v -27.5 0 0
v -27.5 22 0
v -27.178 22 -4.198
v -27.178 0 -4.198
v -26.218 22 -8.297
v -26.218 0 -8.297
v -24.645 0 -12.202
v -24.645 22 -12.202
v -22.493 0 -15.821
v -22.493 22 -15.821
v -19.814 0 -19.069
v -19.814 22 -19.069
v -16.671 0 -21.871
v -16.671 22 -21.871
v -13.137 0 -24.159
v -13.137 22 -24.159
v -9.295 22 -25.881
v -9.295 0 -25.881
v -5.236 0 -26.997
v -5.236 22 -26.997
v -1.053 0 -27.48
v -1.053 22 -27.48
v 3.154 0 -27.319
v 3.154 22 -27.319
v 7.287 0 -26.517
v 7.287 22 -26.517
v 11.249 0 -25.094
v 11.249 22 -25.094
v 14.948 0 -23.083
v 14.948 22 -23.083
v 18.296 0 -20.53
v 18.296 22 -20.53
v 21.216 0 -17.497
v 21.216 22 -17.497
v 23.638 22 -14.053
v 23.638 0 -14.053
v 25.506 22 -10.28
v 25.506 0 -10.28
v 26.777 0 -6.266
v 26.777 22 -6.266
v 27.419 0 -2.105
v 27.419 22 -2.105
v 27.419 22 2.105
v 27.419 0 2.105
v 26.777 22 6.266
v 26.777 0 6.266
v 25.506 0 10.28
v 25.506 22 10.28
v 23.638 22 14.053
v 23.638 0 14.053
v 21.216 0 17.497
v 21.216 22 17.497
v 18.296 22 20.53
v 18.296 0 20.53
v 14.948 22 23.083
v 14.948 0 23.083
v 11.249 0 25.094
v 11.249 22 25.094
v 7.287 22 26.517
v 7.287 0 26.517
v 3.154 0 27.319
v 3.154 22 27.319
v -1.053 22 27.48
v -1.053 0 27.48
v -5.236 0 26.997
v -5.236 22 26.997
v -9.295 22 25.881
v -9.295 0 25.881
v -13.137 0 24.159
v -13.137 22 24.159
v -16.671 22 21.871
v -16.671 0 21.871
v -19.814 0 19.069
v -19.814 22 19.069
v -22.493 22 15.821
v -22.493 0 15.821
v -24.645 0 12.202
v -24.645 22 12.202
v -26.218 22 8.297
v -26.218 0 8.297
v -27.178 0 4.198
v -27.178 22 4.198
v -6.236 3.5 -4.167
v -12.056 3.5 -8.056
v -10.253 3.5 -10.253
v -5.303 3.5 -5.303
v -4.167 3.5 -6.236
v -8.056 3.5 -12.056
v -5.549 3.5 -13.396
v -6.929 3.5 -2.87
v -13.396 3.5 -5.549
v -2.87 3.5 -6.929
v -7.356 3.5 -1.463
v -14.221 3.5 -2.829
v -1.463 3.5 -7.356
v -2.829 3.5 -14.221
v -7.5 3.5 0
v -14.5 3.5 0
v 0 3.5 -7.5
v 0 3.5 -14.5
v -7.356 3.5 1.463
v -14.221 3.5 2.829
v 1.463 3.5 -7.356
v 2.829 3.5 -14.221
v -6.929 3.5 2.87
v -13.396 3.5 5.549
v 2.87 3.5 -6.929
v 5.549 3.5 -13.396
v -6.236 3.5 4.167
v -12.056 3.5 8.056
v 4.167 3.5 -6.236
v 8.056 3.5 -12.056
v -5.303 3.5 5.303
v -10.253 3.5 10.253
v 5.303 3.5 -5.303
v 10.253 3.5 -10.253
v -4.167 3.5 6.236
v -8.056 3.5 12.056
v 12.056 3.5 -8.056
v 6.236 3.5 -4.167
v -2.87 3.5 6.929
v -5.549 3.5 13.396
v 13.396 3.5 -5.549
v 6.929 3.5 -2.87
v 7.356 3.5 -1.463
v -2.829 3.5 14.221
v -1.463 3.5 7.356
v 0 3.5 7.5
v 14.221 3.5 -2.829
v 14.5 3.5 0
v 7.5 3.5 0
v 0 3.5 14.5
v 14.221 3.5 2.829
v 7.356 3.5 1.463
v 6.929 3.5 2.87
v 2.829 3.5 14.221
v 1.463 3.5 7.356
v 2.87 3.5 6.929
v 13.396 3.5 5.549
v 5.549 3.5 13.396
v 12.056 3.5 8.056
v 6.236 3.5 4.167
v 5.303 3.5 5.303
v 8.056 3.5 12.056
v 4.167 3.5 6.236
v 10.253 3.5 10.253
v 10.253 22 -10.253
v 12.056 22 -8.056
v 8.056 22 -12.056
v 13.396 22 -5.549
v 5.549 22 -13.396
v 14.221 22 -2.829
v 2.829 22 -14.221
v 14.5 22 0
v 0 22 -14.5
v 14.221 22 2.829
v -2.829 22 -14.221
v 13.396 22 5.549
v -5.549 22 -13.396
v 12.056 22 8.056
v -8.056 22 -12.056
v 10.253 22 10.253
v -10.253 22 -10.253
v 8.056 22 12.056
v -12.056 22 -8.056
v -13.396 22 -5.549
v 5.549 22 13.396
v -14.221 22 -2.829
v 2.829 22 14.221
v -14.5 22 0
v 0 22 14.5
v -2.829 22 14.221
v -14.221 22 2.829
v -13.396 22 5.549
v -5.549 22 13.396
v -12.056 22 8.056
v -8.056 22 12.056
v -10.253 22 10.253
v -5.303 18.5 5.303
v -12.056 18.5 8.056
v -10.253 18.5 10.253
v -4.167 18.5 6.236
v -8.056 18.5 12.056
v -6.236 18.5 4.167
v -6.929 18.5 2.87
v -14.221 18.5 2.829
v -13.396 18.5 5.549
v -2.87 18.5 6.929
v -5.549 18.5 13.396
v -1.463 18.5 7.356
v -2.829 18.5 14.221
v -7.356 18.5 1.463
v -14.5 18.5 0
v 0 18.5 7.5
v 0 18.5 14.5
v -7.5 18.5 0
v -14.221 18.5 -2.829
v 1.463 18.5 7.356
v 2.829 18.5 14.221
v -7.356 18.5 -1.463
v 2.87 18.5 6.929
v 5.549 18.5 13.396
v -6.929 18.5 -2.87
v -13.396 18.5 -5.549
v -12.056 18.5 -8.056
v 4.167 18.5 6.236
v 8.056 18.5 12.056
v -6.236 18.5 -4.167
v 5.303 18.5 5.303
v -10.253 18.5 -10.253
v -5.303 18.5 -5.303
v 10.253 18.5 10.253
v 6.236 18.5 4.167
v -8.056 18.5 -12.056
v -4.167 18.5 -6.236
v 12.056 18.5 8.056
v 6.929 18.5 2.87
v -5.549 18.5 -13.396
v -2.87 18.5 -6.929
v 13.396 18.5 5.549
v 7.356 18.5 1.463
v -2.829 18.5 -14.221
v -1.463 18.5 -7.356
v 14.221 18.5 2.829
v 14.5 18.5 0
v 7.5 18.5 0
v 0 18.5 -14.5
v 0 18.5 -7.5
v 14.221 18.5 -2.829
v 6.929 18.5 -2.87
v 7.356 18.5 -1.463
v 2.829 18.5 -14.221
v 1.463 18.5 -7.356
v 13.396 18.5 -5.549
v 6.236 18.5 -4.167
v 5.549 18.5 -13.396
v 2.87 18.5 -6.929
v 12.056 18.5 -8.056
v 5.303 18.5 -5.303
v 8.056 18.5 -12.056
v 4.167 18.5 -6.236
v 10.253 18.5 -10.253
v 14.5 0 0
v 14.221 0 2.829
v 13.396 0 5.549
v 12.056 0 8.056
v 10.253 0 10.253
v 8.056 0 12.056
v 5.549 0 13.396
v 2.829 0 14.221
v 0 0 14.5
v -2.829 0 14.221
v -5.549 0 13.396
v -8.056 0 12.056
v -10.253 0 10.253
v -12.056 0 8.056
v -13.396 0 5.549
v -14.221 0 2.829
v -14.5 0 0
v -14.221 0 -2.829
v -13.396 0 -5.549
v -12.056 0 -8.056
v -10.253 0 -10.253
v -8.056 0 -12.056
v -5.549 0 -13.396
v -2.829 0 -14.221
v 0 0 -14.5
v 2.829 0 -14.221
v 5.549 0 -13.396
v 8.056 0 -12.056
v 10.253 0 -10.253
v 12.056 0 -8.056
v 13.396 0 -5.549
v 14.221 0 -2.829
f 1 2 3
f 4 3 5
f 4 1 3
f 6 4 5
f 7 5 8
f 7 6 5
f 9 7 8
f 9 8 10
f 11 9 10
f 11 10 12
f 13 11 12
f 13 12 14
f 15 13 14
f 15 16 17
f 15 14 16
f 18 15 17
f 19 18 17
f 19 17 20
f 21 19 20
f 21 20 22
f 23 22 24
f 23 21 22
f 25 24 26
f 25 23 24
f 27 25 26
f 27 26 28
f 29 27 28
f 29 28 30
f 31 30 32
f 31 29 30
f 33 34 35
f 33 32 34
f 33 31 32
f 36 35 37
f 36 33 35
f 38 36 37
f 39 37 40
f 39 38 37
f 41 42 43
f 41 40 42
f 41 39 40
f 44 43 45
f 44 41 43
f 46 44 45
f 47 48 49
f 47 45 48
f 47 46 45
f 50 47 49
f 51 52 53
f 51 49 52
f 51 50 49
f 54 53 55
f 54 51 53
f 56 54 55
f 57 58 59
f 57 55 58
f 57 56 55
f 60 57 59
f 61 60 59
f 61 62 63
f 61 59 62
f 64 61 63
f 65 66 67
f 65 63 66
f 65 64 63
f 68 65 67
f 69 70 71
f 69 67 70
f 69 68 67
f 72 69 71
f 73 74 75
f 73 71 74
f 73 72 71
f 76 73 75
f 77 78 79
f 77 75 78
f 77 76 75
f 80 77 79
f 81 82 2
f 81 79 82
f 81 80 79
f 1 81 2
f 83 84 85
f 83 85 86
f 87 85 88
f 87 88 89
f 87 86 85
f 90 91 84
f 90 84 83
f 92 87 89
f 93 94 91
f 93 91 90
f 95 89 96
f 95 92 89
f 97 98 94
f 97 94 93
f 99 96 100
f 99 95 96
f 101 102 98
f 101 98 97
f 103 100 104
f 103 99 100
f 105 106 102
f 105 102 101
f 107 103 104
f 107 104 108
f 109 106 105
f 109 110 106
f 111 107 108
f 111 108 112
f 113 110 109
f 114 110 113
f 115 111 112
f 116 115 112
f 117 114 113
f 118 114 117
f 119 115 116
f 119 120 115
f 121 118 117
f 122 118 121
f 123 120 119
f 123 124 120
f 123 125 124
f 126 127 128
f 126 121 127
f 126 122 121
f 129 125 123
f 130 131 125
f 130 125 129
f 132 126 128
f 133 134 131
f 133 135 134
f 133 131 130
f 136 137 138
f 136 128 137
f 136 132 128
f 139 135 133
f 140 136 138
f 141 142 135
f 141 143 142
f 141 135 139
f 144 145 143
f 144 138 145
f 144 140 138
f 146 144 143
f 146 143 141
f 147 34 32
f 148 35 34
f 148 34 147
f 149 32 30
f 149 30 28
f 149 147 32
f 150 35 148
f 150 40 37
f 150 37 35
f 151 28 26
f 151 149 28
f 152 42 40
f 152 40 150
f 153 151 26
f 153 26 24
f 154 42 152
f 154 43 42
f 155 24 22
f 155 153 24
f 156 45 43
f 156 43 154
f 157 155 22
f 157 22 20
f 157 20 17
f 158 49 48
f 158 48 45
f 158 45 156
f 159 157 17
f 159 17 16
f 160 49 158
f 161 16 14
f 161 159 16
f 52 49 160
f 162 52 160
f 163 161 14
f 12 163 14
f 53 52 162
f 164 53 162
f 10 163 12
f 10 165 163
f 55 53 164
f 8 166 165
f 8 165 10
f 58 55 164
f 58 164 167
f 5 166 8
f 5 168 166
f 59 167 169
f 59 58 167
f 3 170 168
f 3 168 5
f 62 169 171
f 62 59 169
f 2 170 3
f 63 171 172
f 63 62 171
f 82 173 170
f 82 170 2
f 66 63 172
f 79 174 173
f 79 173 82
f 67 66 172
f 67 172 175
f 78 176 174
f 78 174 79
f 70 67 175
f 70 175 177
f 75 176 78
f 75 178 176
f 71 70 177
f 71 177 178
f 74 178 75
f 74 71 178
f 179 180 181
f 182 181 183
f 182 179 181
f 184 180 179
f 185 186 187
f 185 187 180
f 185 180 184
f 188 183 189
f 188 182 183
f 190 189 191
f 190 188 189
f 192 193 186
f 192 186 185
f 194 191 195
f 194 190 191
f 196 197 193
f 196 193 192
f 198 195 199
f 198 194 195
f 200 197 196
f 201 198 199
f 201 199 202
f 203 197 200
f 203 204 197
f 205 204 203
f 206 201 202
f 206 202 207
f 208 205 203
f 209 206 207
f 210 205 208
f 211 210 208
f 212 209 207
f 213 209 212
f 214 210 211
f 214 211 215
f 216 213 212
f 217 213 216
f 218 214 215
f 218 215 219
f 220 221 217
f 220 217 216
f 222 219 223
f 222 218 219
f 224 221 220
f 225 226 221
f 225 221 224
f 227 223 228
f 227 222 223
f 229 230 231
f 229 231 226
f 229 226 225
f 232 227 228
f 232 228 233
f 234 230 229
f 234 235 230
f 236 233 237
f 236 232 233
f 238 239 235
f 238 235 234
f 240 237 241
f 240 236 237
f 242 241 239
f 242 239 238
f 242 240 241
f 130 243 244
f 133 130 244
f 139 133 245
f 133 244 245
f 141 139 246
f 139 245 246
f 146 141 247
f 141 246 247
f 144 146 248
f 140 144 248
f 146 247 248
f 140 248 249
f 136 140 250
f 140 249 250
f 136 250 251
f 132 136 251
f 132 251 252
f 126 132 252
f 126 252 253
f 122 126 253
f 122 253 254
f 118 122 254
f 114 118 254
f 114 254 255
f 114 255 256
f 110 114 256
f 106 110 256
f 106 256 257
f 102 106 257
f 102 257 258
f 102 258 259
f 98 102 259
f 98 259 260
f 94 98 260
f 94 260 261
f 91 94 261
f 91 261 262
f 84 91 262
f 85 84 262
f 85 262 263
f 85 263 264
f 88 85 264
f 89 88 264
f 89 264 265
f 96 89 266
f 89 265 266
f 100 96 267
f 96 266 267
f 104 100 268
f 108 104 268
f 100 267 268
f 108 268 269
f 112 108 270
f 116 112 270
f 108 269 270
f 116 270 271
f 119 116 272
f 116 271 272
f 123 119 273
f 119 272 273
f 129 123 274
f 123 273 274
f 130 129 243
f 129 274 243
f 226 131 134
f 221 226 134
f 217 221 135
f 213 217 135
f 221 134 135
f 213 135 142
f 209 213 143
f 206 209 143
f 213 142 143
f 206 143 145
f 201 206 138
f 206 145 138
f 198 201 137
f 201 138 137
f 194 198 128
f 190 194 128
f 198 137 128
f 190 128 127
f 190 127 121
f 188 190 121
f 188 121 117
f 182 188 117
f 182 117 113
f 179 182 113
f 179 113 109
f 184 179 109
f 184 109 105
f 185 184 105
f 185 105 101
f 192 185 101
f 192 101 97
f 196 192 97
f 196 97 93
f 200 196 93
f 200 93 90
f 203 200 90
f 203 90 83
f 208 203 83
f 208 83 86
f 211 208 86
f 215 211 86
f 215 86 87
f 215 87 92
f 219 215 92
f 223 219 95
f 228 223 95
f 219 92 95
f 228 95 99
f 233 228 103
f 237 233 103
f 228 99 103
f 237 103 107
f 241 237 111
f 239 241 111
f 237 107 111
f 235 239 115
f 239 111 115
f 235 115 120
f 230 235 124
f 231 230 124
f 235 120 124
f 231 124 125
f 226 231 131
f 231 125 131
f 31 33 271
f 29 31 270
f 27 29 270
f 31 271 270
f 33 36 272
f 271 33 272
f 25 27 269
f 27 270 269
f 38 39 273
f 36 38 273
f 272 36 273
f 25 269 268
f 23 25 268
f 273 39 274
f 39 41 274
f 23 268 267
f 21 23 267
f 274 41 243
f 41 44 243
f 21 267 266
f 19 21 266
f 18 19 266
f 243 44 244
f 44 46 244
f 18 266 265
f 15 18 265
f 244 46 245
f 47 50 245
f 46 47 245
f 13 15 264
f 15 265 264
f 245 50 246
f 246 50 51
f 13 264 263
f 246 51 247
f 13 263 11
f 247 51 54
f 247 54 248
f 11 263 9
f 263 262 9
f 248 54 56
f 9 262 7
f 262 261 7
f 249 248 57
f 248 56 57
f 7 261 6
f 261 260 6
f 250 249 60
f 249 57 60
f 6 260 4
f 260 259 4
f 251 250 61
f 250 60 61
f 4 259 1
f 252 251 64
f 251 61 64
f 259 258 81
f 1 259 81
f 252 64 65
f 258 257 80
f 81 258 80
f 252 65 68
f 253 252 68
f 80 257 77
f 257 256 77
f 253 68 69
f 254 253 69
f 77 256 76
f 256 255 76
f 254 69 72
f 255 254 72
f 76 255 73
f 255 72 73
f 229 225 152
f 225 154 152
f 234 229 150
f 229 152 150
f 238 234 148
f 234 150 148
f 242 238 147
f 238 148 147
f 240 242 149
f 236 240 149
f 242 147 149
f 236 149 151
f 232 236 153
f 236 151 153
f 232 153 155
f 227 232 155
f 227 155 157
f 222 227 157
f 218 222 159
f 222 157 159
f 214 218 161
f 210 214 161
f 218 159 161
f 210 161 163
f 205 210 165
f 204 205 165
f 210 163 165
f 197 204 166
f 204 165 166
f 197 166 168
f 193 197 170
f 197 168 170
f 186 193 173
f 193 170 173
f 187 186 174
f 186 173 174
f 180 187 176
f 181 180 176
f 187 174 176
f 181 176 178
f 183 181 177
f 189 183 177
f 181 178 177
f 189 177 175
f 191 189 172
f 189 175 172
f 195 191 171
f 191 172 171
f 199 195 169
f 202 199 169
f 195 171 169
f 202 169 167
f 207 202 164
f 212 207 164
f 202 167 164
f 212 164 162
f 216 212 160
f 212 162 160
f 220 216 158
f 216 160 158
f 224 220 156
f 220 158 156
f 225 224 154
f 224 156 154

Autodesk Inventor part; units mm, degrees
ref_plane "YZ Plane" through (0, 0, 0) normal (1, 0, 0) x (0, 1, 0)
ref_plane "XZ Plane" through (0, 0, 0) normal (0, 1, 0) x (-1, 0, 0)
ref_plane "XY Plane" through (0, 0, 0) normal (0, 0, 1) x (1, 0, 0)
sketch "Sketch1" plane through (0, 0, 0) normal (0, 1, 0) x (-1, 0, 0)
  circle A0 centre (0, 0) radius 27.5
  dimension "d0" = 55
extrude "Extrusion1" add sketch "Sketch1" along normal blind 22
sketch "Sketch2" plane through (0, 22, 0) normal (0, 1, 0) x (1, 0, 0)
  circle A0 centre (0, 0) radius 14.5
  dimension "d3" = 29
extrude "Extrusion2" cut sketch "Sketch2" against normal blind 3.5
sketch "Sketch3" plane through (0, 0, 0) normal (0, -1, 0) x (1, 0, 0)
  circle A0 centre (0, 0) radius 14.5
extrude "Extrusion3" cut sketch "Sketch3" against normal blind 3.5
sketch "Sketch4" plane through (0, 3.5, 0) normal (0, -1, 0) x (1, 0, 0)
  circle A0 centre (0, 0) radius 7.5
  dimension "d8" = 15
extrude "Extrusion4" cut sketch "Sketch4" against normal blind 36.5
properties part number "wheel" material "EIFS, Exterior Insulation"
